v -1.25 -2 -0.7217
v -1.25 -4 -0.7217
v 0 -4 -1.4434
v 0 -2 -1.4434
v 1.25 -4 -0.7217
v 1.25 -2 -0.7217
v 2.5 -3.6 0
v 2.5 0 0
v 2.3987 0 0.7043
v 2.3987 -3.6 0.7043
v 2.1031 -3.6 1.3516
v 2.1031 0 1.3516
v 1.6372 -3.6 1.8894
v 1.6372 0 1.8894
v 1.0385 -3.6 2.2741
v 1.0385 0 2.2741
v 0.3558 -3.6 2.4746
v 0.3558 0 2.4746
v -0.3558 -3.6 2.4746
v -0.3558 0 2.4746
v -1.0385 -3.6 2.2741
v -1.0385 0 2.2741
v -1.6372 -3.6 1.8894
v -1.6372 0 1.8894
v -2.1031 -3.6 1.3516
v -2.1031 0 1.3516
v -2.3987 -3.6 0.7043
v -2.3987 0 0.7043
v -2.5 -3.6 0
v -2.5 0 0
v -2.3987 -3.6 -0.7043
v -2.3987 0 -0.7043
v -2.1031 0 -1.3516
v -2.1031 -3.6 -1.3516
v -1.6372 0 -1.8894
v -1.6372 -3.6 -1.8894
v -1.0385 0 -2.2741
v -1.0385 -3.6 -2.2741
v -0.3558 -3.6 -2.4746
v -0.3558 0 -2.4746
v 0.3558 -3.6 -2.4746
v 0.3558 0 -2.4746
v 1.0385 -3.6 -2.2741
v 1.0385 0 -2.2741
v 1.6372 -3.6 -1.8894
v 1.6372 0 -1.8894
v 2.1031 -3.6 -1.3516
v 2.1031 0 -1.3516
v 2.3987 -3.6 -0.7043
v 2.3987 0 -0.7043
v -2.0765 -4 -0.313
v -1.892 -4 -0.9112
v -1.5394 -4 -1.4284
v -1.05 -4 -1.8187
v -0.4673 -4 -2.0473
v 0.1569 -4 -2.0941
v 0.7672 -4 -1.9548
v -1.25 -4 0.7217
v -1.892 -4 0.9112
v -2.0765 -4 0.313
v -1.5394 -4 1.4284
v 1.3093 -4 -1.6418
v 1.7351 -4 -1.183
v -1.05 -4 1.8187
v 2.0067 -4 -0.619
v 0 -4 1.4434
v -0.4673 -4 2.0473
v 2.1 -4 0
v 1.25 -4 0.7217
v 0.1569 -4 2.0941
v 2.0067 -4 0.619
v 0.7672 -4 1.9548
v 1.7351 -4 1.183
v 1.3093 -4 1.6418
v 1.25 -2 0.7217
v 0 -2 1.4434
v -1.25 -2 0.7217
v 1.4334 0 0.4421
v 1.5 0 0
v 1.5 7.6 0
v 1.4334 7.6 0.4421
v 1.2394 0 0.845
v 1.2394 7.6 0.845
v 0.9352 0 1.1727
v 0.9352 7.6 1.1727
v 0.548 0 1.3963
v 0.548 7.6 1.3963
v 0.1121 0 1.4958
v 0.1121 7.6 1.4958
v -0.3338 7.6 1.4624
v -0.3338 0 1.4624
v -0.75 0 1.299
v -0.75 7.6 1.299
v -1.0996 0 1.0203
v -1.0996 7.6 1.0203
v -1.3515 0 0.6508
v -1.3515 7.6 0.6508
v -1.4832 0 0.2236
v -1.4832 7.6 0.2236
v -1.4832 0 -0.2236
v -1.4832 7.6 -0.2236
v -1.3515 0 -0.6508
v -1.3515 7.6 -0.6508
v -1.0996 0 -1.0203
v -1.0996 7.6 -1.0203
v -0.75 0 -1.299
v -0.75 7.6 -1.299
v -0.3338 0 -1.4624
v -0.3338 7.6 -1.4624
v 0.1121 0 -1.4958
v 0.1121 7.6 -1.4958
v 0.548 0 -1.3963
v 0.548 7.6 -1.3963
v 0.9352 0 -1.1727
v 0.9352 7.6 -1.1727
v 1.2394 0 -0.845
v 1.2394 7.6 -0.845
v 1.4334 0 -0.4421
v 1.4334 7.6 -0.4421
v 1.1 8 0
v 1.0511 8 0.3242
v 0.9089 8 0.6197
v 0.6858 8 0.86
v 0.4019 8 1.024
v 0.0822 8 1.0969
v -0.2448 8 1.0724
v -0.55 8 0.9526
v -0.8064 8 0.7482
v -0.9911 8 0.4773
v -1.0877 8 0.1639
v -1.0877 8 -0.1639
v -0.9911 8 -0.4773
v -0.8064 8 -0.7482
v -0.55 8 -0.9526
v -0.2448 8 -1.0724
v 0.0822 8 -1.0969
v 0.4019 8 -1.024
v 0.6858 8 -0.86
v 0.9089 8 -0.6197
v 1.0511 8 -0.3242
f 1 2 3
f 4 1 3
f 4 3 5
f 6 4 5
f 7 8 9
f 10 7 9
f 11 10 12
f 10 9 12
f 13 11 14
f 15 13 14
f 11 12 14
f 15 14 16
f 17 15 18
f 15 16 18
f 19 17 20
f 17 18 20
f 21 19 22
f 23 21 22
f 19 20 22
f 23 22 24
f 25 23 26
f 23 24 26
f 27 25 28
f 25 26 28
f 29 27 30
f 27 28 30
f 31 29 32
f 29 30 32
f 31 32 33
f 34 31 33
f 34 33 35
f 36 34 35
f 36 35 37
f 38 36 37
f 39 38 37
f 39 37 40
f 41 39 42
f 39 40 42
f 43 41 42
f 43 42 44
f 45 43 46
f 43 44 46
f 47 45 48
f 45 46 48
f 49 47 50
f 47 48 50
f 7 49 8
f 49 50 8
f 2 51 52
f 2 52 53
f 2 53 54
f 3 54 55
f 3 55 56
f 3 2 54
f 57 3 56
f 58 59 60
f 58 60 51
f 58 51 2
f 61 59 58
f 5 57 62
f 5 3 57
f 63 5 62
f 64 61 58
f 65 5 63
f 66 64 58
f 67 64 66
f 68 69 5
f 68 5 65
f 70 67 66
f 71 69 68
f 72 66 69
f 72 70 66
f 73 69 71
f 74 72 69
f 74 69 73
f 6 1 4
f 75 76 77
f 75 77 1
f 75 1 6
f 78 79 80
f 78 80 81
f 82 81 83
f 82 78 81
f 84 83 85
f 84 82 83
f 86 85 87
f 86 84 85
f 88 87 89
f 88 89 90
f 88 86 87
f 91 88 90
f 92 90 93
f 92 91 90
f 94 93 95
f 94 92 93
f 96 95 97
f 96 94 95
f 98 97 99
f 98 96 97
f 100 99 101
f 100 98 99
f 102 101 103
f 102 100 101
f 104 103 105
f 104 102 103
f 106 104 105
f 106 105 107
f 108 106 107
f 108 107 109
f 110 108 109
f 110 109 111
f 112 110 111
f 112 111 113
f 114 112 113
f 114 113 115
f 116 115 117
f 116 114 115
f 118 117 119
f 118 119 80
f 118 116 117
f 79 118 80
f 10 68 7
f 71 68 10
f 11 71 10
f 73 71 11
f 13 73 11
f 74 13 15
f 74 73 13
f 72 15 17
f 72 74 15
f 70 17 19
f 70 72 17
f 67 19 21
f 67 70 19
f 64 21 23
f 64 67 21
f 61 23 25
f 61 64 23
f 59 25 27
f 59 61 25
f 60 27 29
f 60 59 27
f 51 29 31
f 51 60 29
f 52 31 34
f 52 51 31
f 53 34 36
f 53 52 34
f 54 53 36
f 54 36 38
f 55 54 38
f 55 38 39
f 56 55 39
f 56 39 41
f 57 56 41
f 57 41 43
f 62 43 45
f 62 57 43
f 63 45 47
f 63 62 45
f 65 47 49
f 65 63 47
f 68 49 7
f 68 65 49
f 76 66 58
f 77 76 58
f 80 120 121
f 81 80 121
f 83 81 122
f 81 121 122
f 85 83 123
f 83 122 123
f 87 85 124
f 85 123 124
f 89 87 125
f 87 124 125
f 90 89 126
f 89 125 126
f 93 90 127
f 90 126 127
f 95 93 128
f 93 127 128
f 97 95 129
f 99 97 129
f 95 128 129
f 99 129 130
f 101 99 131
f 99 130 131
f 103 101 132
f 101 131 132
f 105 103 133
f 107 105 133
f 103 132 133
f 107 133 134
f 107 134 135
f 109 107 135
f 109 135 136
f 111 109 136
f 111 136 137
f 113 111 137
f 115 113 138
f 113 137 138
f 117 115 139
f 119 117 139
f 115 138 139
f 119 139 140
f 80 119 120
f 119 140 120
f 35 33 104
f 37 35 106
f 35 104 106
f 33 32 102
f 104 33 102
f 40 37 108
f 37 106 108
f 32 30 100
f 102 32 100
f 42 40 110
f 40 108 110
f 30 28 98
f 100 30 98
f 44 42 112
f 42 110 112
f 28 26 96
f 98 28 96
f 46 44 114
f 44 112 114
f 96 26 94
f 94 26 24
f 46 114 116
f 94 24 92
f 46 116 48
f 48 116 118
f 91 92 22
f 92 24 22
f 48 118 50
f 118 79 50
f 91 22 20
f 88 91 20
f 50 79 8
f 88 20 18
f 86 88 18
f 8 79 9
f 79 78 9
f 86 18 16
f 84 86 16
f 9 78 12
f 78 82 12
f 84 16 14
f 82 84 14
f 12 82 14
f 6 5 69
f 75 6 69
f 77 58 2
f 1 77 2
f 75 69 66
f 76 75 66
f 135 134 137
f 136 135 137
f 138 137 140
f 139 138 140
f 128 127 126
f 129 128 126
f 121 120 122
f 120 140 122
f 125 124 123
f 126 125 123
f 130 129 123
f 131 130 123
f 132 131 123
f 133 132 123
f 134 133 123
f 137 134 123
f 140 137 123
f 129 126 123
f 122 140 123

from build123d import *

# Parameters (mm, degrees)
F0_R     = 1.5
F1_DEPTH = 8
F0_R_2   = 2.5
F2_DEPTH = 4
F4_DEPTH = 2
F5_SIZE  = 0.4


# Not quite as in the source:
# - a feature names something its author has since deleted; it is built from what else it names


with BuildPart() as f1:
    # F0 (on Front) → F1 (new body)
    with BuildSketch(Plane.XZ):
        Circle(F0_R)
    extrude(amount=-F1_DEPTH)

    # F0 (on Front) → F2 (join)
    with BuildSketch(Plane.XZ):
        Circle(F0_R_2)
        Circle(F0_R, mode=Mode.SUBTRACT)
        Circle(F0_R)
    extrude(amount=F2_DEPTH)

    # F3 (on face) → F4 (cut)
    with BuildSketch(Plane.XZ.offset(4)):
        Polygon((1.25, -0.7216878365), (1.25, 0.7216878365), (0, 1.443375673), (-1.25, 0.7216878365), (-1.25, -0.7216878365), (0, -1.443375673), align=None)
    extrude(amount=-F4_DEPTH, mode=Mode.SUBTRACT)

    # F5
    f5_edges = [f1.edges().sort_by_distance(p)[0] for p in [
        (-2.5, -4, 0),
        (-1.5, 8, 0),
    ]]
    chamfer(f5_edges, length=F5_SIZE)


solid = f1.part
